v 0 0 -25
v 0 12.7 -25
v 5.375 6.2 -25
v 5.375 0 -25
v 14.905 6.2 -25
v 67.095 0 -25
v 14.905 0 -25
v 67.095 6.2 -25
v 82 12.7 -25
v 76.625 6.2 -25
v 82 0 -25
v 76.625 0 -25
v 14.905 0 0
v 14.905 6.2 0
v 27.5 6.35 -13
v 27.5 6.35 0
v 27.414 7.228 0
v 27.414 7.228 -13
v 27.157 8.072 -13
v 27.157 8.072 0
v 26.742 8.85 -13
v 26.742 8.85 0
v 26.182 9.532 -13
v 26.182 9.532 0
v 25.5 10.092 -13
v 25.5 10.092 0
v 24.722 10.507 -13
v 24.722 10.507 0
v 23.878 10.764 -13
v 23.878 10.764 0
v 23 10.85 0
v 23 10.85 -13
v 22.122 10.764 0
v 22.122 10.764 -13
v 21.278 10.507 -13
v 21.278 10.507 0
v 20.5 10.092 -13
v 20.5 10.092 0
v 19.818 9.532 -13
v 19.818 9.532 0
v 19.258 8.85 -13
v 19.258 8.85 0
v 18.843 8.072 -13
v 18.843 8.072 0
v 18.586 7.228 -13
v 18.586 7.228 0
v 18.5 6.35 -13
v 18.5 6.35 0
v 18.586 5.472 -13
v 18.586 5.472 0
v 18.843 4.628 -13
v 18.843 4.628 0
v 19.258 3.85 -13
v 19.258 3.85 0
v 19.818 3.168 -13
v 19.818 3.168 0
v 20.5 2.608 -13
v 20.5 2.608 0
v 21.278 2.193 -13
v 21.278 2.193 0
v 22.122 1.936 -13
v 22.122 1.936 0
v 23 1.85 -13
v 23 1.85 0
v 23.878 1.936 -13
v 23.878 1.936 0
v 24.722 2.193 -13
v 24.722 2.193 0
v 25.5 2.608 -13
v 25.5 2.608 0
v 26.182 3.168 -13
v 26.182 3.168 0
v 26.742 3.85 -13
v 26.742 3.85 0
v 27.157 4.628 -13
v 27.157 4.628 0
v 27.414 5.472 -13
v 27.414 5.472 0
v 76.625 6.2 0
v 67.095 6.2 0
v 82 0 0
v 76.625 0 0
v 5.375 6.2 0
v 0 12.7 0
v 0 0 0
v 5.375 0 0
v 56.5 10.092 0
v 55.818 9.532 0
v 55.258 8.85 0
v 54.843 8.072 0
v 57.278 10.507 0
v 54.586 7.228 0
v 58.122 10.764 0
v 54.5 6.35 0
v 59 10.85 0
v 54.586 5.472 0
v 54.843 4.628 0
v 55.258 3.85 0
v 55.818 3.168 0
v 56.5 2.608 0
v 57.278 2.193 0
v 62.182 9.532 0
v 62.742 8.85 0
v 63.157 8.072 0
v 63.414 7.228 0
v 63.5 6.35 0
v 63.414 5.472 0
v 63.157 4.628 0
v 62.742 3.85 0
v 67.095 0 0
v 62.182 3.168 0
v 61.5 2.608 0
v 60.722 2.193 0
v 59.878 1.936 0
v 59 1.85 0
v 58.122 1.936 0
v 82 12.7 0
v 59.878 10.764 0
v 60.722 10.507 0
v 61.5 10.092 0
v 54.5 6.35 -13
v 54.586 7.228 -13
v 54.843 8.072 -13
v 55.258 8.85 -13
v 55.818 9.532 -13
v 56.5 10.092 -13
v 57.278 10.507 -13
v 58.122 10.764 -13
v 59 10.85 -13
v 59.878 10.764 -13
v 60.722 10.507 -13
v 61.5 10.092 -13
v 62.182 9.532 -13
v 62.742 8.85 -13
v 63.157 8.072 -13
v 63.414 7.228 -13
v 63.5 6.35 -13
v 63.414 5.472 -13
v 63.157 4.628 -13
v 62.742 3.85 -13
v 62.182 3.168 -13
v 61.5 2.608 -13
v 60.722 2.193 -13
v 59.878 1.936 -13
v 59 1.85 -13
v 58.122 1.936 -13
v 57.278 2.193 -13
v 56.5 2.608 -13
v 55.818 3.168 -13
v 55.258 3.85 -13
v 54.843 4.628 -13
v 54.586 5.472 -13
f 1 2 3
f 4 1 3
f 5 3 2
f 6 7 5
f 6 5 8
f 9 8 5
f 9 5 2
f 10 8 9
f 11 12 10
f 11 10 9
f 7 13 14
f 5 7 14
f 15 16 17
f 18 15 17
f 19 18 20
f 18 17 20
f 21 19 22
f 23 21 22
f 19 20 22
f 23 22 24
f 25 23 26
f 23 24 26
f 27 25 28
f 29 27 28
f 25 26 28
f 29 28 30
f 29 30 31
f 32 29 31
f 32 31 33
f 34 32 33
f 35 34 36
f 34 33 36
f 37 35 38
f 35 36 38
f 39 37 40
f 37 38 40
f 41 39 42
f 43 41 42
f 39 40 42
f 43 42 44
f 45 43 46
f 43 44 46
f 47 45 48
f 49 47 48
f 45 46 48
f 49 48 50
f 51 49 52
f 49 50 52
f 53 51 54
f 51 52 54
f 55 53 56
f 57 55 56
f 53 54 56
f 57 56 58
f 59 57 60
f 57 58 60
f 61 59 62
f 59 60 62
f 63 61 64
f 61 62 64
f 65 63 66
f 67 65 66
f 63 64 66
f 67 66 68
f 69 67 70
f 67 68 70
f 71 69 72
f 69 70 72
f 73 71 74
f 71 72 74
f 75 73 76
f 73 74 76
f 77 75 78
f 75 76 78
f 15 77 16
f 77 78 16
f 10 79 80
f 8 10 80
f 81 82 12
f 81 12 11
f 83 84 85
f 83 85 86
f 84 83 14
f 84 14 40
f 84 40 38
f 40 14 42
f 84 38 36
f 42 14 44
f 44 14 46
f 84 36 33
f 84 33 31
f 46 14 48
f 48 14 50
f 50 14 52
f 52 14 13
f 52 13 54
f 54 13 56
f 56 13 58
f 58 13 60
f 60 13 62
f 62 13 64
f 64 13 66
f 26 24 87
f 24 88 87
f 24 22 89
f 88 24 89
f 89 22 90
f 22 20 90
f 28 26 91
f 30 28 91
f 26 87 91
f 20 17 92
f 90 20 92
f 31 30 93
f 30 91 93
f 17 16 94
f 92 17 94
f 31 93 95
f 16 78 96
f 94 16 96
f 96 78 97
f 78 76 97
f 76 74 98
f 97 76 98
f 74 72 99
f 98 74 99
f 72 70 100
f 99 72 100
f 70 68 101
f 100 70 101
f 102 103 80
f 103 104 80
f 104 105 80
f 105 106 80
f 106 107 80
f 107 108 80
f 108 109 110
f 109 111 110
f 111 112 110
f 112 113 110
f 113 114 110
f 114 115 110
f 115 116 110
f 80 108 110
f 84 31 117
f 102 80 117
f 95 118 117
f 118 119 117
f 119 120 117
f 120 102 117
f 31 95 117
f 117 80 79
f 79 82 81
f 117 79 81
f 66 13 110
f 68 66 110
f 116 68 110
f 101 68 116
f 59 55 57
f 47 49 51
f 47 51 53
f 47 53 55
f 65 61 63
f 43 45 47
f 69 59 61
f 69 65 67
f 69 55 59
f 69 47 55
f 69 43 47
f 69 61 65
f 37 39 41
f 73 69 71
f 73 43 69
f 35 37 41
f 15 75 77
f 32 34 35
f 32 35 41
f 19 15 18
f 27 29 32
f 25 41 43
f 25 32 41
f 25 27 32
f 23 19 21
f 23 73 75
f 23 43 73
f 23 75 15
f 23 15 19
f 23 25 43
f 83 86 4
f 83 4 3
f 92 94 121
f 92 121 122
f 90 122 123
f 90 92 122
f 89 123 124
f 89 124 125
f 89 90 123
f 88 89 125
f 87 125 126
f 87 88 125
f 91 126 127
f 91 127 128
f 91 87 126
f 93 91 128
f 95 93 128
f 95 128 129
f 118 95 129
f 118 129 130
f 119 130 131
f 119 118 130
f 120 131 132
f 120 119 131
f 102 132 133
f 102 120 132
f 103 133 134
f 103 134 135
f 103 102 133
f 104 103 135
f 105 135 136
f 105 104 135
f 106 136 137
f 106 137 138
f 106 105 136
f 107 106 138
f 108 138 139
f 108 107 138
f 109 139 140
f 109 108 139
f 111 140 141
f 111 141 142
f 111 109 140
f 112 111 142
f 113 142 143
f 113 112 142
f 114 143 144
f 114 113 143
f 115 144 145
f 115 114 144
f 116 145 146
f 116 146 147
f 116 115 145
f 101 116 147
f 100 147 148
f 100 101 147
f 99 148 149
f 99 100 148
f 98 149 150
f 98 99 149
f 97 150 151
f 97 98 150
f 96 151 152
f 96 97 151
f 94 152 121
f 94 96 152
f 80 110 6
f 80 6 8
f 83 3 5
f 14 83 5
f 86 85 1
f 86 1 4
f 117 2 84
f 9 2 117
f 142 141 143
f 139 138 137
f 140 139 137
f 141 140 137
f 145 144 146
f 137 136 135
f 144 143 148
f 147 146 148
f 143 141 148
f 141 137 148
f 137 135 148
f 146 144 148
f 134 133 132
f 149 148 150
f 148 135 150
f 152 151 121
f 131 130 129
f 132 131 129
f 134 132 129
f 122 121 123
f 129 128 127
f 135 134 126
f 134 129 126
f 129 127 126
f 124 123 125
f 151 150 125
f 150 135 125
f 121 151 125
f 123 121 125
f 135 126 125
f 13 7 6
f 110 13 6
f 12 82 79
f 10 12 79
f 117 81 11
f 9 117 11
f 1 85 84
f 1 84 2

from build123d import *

# Parameters (mm, degrees)
SKETCH1_W           = 82
SKETCH1_H           = 25
BOSS_EXTRUDE1_DEPTH = 12.7
SKETCH2_W           = 9.53
SKETCH2_H           = 6.2
CUT_EXTRUDE1_DEPTH  = 26
SKETCH3_R           = 4.5
CUT_EXTRUDE2_DEPTH  = 13


with BuildPart() as part:
    # Sketch1 → Boss-Extrude1 (new body)
    with BuildSketch(Plane(origin=(0, 0, 0), x_dir=(1, 0, 0), z_dir=(0, 1, 0))):
        with Locations((41, 12.5)):
            Rectangle(SKETCH1_W, SKETCH1_H)
    extrude(amount=BOSS_EXTRUDE1_DEPTH)

    # Sketch2 → Cut-Extrude1 (cut, through all)
    with BuildSketch(Plane.XY):
        with Locations((10.14, 3.1)):
            Rectangle(SKETCH2_W, SKETCH2_H)
    cut_extrude1 = extrude(amount=-CUT_EXTRUDE1_DEPTH, mode=Mode.SUBTRACT)

    # Sketch3 → Cut-Extrude2 (cut)
    with BuildSketch(Plane.XY):
        with Locations((23, 6.35)):
            Circle(SKETCH3_R)
    cut_extrude2 = extrude(amount=-CUT_EXTRUDE2_DEPTH, mode=Mode.SUBTRACT)

    # Mirror1: Cut-Extrude1, Cut-Extrude2 across plane
    add(cut_extrude1.mirror(Plane(origin=(41, 0, 0), x_dir=(0, 0, 1), z_dir=(1, 0, 0))), mode=Mode.SUBTRACT)
    add(cut_extrude2.mirror(Plane(origin=(41, 0, 0), x_dir=(0, 0, 1), z_dir=(1, 0, 0))), mode=Mode.SUBTRACT)


solid = part.part
